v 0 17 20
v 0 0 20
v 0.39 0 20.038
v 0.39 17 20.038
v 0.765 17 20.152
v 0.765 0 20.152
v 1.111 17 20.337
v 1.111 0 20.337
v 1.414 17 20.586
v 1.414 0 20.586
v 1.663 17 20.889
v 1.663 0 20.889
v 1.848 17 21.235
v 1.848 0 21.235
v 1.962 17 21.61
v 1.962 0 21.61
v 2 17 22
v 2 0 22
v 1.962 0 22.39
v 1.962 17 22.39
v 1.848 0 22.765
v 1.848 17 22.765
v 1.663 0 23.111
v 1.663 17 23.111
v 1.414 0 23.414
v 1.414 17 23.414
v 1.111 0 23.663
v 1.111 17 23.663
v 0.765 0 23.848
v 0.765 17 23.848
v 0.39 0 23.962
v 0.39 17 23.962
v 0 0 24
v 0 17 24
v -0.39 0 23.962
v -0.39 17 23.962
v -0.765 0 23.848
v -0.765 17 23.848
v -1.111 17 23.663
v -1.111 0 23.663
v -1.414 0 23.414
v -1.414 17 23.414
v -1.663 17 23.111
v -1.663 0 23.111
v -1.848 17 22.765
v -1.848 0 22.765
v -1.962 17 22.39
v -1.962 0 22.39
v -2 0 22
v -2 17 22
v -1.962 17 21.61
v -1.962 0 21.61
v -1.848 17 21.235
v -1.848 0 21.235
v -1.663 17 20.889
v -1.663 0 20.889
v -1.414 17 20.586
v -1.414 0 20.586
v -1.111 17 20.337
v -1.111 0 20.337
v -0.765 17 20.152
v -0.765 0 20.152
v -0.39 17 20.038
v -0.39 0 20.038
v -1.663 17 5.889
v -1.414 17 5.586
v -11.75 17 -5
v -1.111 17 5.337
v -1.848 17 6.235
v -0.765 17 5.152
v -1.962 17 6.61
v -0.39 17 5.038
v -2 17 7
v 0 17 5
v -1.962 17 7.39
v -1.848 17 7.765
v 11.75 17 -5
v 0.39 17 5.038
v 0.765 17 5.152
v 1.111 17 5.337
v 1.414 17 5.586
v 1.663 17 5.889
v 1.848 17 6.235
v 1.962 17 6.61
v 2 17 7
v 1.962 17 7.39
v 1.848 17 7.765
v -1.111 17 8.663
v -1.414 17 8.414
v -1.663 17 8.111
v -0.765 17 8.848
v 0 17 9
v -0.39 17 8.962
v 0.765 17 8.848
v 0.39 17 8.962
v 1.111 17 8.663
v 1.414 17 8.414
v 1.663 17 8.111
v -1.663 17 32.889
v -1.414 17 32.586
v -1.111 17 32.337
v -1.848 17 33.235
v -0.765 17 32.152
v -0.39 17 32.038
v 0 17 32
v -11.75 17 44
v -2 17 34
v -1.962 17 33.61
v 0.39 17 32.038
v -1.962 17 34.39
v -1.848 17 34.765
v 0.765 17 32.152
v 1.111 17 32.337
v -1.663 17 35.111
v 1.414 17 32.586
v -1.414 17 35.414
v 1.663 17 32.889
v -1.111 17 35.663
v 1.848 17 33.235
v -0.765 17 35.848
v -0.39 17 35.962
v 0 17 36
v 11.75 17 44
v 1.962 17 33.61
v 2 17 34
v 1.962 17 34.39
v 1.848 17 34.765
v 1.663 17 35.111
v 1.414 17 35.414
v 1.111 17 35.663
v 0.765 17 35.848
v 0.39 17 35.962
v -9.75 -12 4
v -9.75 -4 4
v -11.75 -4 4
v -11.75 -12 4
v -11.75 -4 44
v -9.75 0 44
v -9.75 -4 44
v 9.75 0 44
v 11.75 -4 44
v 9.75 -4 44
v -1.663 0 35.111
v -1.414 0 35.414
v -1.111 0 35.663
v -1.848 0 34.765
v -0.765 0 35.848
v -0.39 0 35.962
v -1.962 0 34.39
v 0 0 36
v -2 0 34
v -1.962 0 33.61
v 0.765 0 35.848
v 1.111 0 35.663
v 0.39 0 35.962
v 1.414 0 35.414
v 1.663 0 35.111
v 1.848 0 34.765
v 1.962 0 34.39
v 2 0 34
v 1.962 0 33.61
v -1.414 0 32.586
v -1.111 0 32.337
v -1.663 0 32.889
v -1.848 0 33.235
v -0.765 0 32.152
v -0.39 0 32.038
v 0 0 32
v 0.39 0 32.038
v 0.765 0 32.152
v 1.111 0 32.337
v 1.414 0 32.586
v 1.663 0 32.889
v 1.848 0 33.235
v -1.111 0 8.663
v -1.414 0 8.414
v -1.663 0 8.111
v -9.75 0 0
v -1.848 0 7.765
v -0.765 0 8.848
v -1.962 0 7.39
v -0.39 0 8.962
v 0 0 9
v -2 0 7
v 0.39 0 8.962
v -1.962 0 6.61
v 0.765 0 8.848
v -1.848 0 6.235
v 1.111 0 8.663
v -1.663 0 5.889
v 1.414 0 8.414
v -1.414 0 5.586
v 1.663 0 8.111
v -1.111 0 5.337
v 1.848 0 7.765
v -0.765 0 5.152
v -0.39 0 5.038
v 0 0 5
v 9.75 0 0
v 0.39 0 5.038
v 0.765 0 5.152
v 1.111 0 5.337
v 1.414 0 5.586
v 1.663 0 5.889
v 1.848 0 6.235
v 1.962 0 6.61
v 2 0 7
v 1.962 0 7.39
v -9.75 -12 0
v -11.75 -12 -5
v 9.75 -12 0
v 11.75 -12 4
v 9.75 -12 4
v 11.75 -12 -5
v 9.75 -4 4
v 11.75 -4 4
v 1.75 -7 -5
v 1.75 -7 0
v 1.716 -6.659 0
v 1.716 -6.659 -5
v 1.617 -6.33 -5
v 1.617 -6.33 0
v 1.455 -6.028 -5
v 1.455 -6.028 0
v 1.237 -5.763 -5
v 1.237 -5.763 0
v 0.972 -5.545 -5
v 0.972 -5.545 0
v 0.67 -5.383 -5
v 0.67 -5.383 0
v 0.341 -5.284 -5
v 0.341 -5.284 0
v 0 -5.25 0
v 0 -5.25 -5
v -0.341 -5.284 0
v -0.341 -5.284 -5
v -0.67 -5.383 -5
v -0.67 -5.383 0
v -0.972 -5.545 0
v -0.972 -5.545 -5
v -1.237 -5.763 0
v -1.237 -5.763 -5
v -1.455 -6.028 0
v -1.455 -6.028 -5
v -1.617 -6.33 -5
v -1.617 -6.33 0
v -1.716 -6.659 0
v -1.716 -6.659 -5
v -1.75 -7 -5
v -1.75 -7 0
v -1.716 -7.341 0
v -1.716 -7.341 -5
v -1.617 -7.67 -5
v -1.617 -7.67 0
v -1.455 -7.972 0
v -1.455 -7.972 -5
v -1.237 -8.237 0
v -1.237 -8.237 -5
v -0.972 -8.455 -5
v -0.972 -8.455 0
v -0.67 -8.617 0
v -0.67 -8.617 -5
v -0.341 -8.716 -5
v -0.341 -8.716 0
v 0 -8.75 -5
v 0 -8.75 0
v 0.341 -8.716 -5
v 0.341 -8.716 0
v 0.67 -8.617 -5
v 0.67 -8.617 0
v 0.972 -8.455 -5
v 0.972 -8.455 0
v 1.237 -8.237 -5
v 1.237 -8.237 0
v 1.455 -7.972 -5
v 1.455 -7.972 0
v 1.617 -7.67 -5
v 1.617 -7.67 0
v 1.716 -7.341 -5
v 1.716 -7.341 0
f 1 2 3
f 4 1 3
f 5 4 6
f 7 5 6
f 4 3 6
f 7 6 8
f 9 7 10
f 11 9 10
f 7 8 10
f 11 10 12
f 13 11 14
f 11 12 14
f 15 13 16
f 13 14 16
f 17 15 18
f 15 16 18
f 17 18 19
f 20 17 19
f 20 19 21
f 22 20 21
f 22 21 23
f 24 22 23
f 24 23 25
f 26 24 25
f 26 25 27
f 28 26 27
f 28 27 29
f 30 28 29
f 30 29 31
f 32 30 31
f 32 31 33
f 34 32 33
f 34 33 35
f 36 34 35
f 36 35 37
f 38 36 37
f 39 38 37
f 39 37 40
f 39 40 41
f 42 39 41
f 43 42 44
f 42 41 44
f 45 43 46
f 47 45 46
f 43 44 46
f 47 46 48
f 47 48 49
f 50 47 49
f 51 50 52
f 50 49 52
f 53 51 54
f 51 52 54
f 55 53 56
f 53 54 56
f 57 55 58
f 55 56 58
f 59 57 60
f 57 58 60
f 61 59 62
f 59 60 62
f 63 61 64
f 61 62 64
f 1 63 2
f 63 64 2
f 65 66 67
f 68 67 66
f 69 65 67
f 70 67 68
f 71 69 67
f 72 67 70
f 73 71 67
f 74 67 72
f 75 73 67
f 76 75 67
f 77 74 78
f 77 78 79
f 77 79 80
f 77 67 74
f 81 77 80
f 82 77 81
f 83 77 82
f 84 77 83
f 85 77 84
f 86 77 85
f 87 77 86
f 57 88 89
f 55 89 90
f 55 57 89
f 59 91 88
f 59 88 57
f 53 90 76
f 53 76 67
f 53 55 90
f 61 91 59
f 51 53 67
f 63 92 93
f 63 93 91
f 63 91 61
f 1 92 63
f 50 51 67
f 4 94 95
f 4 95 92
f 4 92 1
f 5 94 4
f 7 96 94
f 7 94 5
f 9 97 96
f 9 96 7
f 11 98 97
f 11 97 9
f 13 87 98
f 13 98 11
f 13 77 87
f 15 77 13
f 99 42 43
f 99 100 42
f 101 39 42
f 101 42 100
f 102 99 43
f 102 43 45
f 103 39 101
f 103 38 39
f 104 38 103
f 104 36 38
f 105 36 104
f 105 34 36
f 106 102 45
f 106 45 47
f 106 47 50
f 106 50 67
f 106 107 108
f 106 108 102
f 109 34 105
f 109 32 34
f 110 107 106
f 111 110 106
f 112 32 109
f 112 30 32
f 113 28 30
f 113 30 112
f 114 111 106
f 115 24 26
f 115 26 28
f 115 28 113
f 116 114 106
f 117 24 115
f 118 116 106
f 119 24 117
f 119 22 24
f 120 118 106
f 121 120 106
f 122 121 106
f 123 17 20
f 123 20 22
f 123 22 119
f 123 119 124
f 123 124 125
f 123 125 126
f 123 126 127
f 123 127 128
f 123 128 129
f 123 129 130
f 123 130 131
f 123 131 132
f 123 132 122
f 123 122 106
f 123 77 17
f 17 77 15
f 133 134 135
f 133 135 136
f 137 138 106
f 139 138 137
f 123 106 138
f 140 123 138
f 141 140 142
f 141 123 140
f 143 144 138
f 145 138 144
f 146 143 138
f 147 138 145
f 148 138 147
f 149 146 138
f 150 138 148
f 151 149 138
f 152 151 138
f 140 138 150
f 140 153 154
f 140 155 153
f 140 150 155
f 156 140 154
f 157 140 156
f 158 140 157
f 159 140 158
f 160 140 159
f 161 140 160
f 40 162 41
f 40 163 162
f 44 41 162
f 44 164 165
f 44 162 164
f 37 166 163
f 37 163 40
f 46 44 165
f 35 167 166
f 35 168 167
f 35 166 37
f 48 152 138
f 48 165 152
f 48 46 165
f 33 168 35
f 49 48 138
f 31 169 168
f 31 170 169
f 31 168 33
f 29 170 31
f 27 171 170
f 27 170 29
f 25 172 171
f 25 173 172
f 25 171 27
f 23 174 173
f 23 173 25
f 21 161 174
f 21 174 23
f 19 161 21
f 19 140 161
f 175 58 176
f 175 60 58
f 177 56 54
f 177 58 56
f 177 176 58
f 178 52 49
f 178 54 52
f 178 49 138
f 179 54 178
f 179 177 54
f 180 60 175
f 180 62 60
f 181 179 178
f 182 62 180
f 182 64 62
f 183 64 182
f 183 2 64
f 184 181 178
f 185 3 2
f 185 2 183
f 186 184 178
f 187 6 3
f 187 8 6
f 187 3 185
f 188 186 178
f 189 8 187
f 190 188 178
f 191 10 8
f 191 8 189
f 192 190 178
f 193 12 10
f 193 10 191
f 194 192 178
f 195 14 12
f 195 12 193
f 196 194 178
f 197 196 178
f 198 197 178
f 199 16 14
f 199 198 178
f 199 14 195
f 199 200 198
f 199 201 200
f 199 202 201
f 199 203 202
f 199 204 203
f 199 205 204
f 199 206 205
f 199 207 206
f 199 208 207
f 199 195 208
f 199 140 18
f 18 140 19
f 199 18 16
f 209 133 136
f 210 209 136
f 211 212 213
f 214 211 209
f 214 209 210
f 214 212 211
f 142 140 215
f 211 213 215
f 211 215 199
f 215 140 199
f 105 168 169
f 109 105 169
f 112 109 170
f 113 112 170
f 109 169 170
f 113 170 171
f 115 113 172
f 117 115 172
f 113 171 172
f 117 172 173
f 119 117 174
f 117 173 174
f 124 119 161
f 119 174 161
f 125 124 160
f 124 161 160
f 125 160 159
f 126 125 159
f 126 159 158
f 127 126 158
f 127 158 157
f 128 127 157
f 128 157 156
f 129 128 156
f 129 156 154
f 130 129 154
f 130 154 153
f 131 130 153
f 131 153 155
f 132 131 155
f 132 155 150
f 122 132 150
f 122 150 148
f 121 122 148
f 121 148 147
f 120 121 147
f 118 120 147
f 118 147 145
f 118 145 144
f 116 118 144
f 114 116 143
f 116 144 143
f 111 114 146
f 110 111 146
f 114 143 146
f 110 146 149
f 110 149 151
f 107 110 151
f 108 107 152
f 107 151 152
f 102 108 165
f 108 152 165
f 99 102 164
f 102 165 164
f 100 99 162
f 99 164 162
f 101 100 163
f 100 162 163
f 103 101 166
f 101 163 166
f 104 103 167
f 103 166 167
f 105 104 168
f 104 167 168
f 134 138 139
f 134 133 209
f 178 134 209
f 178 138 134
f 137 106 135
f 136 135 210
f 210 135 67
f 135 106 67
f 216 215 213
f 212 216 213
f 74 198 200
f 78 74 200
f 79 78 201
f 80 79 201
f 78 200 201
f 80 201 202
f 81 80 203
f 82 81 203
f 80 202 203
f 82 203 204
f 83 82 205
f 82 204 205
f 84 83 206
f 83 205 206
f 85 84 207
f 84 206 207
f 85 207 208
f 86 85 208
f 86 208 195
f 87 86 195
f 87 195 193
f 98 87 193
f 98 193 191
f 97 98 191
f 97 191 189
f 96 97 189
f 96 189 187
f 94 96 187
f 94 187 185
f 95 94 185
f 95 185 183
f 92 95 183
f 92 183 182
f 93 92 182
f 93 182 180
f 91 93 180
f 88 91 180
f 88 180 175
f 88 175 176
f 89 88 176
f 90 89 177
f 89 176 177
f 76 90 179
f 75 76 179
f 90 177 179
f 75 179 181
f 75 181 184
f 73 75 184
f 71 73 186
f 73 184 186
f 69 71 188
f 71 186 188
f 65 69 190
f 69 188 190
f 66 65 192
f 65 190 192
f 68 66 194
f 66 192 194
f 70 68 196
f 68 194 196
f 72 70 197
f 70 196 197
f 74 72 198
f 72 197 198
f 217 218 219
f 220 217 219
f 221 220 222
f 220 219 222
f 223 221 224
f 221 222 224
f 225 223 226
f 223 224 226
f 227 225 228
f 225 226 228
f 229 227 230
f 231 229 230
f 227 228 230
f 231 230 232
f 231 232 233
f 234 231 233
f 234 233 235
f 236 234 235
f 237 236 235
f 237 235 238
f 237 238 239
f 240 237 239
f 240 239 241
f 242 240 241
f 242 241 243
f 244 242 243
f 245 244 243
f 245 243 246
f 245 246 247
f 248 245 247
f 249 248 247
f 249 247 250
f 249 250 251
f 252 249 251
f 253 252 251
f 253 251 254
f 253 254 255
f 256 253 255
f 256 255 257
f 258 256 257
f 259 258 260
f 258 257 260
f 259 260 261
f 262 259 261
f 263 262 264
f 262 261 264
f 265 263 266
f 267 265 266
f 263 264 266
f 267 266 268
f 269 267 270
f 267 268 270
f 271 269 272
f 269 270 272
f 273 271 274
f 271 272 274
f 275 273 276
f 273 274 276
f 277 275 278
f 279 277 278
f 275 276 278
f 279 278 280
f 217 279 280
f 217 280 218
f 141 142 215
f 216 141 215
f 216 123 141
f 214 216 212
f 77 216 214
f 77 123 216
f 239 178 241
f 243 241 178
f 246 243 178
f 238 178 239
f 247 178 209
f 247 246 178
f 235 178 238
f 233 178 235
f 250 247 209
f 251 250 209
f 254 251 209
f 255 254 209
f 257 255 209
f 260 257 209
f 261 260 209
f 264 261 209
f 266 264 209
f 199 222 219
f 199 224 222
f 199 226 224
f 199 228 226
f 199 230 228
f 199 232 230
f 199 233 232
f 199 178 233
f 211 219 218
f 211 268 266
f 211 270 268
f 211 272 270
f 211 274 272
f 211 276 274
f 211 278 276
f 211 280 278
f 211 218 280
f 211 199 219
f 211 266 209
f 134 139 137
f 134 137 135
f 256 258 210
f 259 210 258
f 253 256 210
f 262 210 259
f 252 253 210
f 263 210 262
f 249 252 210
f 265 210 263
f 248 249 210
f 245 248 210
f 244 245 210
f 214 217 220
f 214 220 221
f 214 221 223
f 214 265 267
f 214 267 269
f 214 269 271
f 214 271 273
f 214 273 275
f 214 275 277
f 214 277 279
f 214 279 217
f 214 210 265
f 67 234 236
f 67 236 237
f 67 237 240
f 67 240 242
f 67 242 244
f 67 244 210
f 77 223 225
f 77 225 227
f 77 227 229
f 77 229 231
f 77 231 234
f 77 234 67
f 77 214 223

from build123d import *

# Parameters (mm, degrees)
BOSS_EXTRUDE1_DEPTH = 9.75
BOSS_EXTRUDE2_DEPTH = 2
SKETCH4_R           = 2
CUT_EXTRUDE1_DEPTH  = 49.611341269
SKETCH5_R           = 1.75
CUT_EXTRUDE2_DEPTH  = 49.611341269


with BuildPart() as part:
    # Sketch2 → Boss-Extrude1 (new, symmetric)
    with BuildSketch(Plane(origin=(0, 0, 0), x_dir=(0, 0, -1), z_dir=(1, 0, 0))):
        Polygon((-44, 0), (0, 0), (0, -12), (5, -12), (5, 17), (-44, 17), align=None)
    extrude(amount=BOSS_EXTRUDE1_DEPTH, both=True)

    # Sketch3 → Boss-Extrude2 (add)
    with BuildSketch(Plane(origin=(9.75, 0, 0), x_dir=(0, 0, -1), z_dir=(1, 0, 0))):
        Polygon((-44, 17), (-44, -4), (-4, -4), (-4, -12), (5, -12), (5, 17), align=None)
    boss_extrude2 = extrude(amount=BOSS_EXTRUDE2_DEPTH)

    # Mirror1: Boss-Extrude2 across plane
    add(boss_extrude2.mirror(Plane(origin=(0, 0, 0), x_dir=(0, 0, 1), z_dir=(1, 0, 0))))

    # Sketch4 → Cut-Extrude1 (cut, through all)
    with BuildSketch(Plane.XZ):
        with Locations(Location((0, 34, 0), (0, 0, 270))):
            Circle(SKETCH4_R)
        with Locations(Location((0, 22, 0), (0, 0, 270))):
            Circle(SKETCH4_R)
        with Locations(Location((0, 7, 0), (0, 0, 270))):
            Circle(SKETCH4_R)
    extrude(amount=-CUT_EXTRUDE1_DEPTH, mode=Mode.SUBTRACT)

    # Sketch5 → Cut-Extrude2 (cut, through all)
    with BuildSketch(Plane.XY):
        with Locations((0, -7)):
            Circle(SKETCH5_R)
    extrude(amount=-CUT_EXTRUDE2_DEPTH, mode=Mode.SUBTRACT)


solid = part.part
